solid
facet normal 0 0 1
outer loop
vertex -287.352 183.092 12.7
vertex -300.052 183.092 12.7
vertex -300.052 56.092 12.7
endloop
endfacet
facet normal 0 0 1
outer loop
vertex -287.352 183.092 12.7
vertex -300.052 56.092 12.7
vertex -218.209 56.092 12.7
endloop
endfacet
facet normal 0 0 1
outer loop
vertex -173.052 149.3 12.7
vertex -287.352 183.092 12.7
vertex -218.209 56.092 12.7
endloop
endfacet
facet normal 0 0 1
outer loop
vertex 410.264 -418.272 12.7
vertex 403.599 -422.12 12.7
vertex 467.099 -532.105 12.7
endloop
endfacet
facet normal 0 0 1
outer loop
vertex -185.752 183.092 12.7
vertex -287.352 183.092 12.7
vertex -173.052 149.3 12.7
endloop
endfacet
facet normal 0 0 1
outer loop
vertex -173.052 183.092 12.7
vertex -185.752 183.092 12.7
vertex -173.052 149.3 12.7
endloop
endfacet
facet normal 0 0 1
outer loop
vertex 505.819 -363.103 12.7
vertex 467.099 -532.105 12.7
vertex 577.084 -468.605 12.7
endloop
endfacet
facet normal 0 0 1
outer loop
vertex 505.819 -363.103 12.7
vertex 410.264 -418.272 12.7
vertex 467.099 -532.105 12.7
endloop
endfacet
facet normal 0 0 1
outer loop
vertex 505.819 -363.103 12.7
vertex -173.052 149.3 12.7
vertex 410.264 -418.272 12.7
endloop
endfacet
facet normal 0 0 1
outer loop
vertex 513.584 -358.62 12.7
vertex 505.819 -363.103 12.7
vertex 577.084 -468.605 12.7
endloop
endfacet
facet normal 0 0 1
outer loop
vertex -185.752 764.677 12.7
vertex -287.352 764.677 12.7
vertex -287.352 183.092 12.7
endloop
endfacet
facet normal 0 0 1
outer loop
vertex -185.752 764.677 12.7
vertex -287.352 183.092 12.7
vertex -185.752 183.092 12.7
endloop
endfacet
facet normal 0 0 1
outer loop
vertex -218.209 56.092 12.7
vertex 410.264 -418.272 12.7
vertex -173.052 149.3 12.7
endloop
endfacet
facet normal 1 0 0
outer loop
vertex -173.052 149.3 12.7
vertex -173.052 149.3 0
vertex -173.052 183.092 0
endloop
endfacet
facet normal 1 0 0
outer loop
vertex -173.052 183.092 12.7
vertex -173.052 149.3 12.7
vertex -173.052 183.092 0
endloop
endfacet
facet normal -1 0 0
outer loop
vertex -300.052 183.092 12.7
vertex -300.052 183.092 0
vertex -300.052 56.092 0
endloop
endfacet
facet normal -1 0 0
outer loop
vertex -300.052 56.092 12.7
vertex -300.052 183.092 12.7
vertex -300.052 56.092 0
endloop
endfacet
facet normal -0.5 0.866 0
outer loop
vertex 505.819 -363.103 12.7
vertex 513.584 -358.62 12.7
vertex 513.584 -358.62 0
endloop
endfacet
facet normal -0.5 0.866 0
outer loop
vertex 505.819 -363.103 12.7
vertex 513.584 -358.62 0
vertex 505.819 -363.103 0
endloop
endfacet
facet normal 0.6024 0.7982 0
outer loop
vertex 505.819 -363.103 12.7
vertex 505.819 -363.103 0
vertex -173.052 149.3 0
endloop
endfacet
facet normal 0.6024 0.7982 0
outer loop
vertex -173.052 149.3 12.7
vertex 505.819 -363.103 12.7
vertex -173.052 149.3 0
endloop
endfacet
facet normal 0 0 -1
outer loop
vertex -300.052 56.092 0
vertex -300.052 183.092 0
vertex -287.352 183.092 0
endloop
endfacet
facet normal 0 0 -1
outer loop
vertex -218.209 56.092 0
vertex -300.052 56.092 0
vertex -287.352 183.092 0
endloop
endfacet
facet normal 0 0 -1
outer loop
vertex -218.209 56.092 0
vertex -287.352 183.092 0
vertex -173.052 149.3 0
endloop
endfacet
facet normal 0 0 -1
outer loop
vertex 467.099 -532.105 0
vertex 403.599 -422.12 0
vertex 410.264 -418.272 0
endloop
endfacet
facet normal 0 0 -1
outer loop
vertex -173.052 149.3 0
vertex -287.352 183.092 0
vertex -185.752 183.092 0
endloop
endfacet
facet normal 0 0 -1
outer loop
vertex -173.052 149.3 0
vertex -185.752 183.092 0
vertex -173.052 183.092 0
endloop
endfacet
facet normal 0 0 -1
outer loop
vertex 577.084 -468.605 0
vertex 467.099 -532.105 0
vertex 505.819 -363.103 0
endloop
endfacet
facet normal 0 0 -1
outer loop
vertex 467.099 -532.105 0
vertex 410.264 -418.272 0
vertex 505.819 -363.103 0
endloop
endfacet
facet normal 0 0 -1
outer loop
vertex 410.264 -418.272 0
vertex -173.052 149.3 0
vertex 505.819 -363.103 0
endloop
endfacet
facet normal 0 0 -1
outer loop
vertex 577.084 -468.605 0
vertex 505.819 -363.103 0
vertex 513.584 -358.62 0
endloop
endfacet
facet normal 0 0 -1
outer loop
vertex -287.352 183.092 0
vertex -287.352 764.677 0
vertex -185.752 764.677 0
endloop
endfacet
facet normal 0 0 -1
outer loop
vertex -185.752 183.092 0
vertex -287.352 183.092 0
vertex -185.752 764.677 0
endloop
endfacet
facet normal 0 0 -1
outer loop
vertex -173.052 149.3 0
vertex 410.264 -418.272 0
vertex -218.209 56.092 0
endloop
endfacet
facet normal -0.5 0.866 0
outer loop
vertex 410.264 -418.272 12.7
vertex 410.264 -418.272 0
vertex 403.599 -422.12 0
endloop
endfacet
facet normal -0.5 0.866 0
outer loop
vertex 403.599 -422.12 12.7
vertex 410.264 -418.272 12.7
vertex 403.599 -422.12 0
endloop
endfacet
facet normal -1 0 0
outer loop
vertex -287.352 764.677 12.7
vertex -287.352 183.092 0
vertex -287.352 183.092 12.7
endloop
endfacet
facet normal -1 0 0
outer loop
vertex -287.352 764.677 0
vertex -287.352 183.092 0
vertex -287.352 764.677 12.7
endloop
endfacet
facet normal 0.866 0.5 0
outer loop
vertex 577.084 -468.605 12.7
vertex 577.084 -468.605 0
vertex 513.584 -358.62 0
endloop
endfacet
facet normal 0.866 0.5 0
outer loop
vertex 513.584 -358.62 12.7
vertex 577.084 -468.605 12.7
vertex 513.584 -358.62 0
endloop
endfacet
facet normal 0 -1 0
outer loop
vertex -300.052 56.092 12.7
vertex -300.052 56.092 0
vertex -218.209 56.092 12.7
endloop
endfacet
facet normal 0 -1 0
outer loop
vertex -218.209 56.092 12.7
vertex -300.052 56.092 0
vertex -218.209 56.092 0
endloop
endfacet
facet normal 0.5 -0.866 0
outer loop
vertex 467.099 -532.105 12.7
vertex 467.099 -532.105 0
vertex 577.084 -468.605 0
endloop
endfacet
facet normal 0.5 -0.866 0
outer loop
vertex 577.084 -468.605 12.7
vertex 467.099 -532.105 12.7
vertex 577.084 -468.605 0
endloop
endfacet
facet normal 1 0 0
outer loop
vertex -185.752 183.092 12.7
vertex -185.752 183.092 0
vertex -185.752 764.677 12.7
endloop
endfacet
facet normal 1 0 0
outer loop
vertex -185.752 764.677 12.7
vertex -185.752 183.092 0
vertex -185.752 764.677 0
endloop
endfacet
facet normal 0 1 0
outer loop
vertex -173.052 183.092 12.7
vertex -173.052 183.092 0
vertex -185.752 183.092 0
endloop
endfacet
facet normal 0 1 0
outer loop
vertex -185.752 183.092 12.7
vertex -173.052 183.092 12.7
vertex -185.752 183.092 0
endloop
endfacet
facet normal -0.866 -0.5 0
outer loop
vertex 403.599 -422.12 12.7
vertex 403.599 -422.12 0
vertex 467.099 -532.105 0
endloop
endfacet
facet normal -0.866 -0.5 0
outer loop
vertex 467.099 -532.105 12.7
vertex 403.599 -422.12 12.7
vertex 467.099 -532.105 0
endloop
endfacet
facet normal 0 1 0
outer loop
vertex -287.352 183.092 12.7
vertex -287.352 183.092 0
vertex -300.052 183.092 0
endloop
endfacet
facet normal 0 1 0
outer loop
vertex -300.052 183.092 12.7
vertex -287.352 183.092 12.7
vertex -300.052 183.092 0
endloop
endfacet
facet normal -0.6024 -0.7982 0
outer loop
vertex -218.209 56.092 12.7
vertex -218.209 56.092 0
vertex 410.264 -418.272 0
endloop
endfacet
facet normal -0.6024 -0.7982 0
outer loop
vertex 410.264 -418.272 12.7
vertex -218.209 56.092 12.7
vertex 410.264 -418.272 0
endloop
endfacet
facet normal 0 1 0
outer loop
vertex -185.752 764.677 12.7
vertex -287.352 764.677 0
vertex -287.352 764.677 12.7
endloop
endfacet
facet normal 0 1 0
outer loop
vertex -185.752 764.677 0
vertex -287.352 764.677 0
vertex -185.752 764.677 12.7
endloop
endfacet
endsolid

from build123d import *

# Parameters (mm, degrees)
F0_W     = 101.6
F0_H     = 581.585099
F1_DEPTH = 12.7


with BuildPart() as f1:
    # F0 (on Top) → F1 (new body)
    with BuildSketch(Plane.XY):
        with Locations((-236.551933, 473.884111)):
            Rectangle(F0_W, F0_H)
        Polygon((-185.751933, 183.091562), (-287.351933, 183.091562), (-300.051933, 183.091562), (-300.051933, 56.091562), (-218.208847, 56.091562), (410.263863, -418.272025), (505.818866, -363.103319), (-173.051933, 149.300135), (-173.051933, 183.091562), align=None)
        Polygon((513.583823, -358.620219), (505.818866, -363.103319), (410.263863, -418.272025), (403.598596, -422.120219), (467.098596, -532.105445), (577.083823, -468.605445), align=None)
    extrude(amount=F1_DEPTH)


solid = f1.part
